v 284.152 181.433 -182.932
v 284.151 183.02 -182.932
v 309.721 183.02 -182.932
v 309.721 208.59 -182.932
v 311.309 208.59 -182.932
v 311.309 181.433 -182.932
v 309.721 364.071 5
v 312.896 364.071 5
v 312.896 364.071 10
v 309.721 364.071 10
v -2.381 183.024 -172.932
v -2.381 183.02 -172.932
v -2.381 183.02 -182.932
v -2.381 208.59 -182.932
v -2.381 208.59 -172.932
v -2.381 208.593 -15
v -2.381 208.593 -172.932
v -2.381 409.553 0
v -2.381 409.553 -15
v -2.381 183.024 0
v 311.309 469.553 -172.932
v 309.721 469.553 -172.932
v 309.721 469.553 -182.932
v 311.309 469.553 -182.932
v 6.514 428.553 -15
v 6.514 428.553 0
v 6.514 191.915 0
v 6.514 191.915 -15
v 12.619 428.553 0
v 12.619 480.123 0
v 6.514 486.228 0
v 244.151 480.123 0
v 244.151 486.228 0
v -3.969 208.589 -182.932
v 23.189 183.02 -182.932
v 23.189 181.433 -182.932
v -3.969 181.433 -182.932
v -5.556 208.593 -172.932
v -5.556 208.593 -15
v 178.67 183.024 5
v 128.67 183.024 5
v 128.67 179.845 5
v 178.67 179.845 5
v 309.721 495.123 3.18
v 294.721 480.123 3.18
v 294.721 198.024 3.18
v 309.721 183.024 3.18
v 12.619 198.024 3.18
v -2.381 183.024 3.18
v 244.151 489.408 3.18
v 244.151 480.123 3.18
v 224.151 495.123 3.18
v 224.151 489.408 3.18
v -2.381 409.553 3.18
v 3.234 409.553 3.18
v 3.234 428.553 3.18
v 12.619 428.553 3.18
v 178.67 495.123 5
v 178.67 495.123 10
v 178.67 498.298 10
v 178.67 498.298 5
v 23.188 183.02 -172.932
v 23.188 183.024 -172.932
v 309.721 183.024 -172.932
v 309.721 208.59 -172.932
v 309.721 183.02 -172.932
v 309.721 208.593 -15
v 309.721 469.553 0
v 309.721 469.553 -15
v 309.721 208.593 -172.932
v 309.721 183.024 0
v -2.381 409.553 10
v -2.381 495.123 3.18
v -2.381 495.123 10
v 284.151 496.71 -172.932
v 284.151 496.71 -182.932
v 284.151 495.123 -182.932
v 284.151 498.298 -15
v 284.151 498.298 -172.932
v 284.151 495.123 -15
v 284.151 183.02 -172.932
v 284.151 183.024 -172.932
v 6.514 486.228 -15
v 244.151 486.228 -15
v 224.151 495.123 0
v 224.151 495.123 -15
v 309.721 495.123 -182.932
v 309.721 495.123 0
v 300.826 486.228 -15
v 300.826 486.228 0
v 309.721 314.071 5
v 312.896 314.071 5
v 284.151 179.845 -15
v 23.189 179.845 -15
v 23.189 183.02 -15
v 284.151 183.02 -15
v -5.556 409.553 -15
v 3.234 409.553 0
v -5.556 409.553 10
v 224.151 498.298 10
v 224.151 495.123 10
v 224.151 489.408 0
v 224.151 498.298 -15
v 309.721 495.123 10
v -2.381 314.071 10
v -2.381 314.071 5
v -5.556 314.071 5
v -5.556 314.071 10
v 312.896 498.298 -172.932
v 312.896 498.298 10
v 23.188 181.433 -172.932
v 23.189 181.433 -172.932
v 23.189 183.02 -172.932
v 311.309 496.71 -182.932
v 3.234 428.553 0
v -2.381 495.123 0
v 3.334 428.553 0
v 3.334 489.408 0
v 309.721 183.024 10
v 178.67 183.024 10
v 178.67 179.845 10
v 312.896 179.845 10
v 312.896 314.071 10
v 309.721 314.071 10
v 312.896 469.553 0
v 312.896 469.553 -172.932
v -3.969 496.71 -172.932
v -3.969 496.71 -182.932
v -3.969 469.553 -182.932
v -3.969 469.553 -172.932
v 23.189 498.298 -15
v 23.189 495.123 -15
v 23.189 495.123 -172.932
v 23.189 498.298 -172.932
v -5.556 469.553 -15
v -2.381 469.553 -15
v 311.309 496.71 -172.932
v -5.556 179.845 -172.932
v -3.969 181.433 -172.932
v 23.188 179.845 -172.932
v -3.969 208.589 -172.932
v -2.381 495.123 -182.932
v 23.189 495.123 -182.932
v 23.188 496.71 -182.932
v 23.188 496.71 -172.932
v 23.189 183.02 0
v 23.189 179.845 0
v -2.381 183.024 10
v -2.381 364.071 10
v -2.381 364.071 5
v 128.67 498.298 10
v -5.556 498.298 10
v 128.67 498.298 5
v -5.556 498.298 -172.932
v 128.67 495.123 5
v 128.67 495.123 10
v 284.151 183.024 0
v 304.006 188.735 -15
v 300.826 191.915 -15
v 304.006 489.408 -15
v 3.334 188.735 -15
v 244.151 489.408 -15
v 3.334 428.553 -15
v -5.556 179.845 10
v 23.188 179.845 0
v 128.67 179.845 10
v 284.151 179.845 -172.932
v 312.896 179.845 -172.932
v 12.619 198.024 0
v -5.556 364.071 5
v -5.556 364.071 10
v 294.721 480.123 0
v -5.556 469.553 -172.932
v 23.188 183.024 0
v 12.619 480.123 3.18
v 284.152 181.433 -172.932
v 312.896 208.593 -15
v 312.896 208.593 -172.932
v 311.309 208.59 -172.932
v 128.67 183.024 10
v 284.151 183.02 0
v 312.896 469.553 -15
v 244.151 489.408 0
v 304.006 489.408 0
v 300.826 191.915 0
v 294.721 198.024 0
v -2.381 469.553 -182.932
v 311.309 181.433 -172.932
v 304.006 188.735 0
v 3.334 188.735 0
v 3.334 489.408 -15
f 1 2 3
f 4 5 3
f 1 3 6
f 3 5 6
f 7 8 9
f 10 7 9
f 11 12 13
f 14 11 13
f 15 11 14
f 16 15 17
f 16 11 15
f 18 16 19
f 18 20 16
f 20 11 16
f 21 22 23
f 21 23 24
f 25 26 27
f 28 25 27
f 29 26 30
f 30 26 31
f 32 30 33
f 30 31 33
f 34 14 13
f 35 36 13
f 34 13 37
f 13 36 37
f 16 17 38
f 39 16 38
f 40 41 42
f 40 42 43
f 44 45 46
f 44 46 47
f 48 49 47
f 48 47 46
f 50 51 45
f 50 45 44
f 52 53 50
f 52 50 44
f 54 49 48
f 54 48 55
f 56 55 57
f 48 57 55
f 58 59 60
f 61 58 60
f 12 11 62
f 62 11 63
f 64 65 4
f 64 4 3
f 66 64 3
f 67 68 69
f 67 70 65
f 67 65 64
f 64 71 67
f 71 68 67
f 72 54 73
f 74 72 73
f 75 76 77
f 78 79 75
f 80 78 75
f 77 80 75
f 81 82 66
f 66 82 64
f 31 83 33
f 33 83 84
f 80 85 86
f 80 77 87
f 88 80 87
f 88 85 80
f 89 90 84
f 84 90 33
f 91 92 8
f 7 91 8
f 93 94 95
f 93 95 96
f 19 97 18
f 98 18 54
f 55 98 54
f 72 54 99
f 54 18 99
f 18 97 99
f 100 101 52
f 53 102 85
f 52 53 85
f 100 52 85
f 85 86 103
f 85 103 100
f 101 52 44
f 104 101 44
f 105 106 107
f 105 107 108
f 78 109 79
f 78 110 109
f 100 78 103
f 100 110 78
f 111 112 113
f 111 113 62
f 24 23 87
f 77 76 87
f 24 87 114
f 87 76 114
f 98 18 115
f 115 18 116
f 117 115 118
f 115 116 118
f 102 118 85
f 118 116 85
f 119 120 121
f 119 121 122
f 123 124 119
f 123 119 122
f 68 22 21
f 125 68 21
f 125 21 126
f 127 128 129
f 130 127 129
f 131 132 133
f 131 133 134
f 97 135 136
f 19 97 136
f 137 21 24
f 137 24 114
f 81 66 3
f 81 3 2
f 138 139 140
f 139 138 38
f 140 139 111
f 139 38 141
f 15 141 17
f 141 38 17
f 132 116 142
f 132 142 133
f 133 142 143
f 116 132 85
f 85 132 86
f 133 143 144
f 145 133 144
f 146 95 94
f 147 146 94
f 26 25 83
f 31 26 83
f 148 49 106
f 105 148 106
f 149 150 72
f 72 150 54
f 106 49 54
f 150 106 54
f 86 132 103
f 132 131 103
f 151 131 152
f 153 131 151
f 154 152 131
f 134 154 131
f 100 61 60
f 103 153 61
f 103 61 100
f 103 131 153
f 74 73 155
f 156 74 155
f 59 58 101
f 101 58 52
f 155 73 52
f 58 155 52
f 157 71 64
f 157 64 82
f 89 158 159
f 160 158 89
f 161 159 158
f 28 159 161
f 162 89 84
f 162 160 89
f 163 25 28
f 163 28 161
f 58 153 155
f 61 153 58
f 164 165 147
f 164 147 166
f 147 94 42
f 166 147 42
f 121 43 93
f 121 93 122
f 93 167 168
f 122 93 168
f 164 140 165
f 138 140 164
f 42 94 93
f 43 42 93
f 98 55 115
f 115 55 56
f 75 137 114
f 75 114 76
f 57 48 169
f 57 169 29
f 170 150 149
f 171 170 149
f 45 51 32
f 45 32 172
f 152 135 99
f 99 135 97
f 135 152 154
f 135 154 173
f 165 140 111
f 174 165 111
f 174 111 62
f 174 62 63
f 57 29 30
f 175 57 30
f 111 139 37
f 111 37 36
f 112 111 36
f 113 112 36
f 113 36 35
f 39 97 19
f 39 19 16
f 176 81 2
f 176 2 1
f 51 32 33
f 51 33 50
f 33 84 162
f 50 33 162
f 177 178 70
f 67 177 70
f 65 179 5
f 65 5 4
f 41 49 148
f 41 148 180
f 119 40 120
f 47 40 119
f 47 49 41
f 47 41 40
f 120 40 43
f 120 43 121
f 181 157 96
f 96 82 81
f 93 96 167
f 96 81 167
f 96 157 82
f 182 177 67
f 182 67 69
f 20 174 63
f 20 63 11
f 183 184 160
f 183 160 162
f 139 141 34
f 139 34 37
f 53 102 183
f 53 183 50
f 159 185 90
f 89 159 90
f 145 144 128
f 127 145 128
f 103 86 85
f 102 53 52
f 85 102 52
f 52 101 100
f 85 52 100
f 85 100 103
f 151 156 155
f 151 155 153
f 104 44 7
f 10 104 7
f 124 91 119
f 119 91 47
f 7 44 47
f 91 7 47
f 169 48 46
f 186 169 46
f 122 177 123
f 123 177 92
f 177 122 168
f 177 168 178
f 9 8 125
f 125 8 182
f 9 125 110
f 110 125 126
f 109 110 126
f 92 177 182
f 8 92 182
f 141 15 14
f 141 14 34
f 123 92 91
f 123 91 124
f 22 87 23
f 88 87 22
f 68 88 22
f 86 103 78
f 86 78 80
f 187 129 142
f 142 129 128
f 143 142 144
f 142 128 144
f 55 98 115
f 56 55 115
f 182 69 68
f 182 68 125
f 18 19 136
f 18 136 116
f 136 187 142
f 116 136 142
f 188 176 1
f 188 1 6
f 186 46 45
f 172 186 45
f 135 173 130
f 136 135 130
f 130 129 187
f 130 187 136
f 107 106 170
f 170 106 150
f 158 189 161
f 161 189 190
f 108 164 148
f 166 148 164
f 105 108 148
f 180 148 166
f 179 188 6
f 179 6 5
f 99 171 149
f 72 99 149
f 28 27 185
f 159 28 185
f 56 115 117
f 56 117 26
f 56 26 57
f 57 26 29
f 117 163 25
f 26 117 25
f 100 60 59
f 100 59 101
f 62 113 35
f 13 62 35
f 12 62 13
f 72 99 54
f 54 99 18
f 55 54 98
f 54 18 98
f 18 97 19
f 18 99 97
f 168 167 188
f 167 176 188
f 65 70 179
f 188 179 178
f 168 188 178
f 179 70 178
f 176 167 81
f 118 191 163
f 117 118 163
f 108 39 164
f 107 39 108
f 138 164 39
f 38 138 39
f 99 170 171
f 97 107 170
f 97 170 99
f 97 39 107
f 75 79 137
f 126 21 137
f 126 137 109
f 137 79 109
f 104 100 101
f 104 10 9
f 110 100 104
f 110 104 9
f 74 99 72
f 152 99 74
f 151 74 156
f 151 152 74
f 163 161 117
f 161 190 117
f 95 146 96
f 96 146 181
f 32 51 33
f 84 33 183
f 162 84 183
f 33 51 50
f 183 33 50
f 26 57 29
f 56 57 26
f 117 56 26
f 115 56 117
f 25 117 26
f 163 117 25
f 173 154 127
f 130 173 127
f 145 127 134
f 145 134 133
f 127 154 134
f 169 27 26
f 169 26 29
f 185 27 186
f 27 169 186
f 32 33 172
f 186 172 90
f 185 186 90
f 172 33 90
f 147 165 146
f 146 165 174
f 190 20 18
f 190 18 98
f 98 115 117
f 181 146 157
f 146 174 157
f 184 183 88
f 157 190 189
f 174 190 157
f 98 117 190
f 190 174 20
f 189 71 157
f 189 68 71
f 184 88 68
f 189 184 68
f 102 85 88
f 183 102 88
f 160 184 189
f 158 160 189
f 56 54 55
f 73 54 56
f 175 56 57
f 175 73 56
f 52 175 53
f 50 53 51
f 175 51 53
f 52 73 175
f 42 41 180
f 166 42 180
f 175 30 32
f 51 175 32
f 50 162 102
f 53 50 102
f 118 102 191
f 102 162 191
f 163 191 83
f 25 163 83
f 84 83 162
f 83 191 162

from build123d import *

# Parameters (mm, degrees)
SKETCH1_W                = 260.9625
SKETCH1_H                = 3.175
BOSS_EXTRUDE1_DEPTH      = 10
SKETCH1_W_2              = 3.175
SKETCH1_H_2              = 260.959519773
BOSS_EXTRUDE1_2_DEPTH    = 10
SKETCH1_H_3              = 260.960289546
BOSS_EXTRUDE1_3_DEPTH    = 10
SKETCH1_W_3              = 260.963269773
SKETCH1_H_4              = 3.17875
BOSS_EXTRUDE1_4_DEPTH    = 10
SKETCH1_2_W              = 312.1025
SKETCH1_2_H              = 312.09875
BOSS_EXTRUDE2_DEPTH      = 3.18
BOSS_EXTRUDE4_DEPTH      = 10
BOSS_EXTRUDE4_DEPTH_BACK = 172.932
SKETCH2_W                = 282.1025
SKETCH2_H                = 282.09875
CUT_EXTRUDE1_DEPTH       = 3.18
CUT_EXTRUDE2_START       = -318.4525
SKETCH4_W                = 5
SKETCH4_H                = 50
CUT_EXTRUDE2_DEPTH       = 318.4525
CUT_EXTRUDE3_START       = -318.4525
SKETCH5_W                = 50
SKETCH5_H                = 5
CUT_EXTRUDE3_DEPTH       = 318.4525
SKETCH6_W                = 300.6725
SKETCH6_H                = 3.18
SKETCH6_W_2              = 260.9625
SKETCH6_H_2              = 3.175
BOSS_EXTRUDE5_DEPTH      = 15
CIRPATTERN11_COUNT       = 4
BOSS_EXTRUDE9_DEPTH      = 10
CIRPATTERN16_COUNT       = 4
SPLIT1_START             = -15
SPLIT1_DEPTH             = 18.18
SPLIT1_START_2           = -172.932
SPLIT1_2_DEPTH           = 182.932
SPLIT1_3_DEPTH           = 3.18
SPLIT1_START_3           = 3.18
SPLIT1_4_OUTLINE_W       = 45.48125
SPLIT1_4_OUTLINE_H       = 3.175
SPLIT1_4_OUTLINE_W_2     = 105.48125
SPLIT1_4_OUTLINE_W_3     = 3.175
SPLIT1_4_OUTLINE_H_2     = 60
SPLIT1_4_DEPTH           = 6.82
SPLIT1_START_4           = -182.932
SPLIT1_5_DEPTH           = 10
SPLIT1_6_OUTLINE_W       = 50
SPLIT1_6_OUTLINE_H       = 3.175
SPLIT1_6_DEPTH           = 1.82
SPLIT1_START_5           = -5.55625
SPLIT1_7_DEPTH           = 249.7075
SPLIT1_8_DEPTH           = 229.7075
SPLIT1_9_OUTLINE_W       = 19
SPLIT1_9_OUTLINE_H       = 18.18
SPLIT1_9_DEPTH           = 8.79


# Read off the part's stored shape, not the designer's step: Split1
with BuildPart() as part:
    # Sketch1 → Boss-Extrude1 (new body)
    with BuildSketch(Plane.XY):
        with Locations((153.67, 496.71005)):
            Rectangle(SKETCH1_W, SKETCH1_H)
    extrude(amount=BOSS_EXTRUDE1_DEPTH)



with BuildPart() as body_2:
    # Sketch1 → Boss-Extrude1 2 (new body)
    with BuildSketch(Plane.XY):
        with Locations((-3.96875, 339.072790114)):
            Rectangle(SKETCH1_W_2, SKETCH1_H_2)
    extrude(amount=BOSS_EXTRUDE1_2_DEPTH)


with BuildPart() as body_3:
    # Sketch1 → Boss-Extrude1 3 (new body)
    with BuildSketch(Plane.XY):
        with Locations((311.30875, 339.073175)):
            Rectangle(SKETCH1_W_2, SKETCH1_H_3)
    extrude(amount=BOSS_EXTRUDE1_3_DEPTH)


with BuildPart() as body_4:
    # Sketch1 → Boss-Extrude1 4 (new body)
    with BuildSketch(Plane.XY):
        with Locations((153.669615114, 181.434425)):
            Rectangle(SKETCH1_W_3, SKETCH1_H_4)
    extrude(amount=BOSS_EXTRUDE1_4_DEPTH)


with BuildPart() as part_1:
    add(part.part)

    add(body_2.part)  # Boss-Extrude2 merges body 2

    add(body_3.part)  # Boss-Extrude2 merges body 3

    add(body_4.part)  # Boss-Extrude2 merges body 4
    # Sketch1<2> → Boss-Extrude2 (add)
    with BuildSketch(Plane.XY):
        with Locations((153.67, 339.073175)):
            Rectangle(SKETCH1_2_W, SKETCH1_2_H)
    extrude(amount=BOSS_EXTRUDE2_DEPTH)

    # Sketch1<5> → Boss-Extrude4 (add, two sides: drawn at the far end of the back side and taken through both)
    with BuildSketch(Plane.XY.offset(-BOSS_EXTRUDE4_DEPTH_BACK)):
        Polygon((284.15125, 495.12255), (309.72125, 495.12255), (309.72125, 469.553319773), (312.89625, 469.553319773), (312.89625, 498.29755), (284.15125, 498.29755), align=None)
        Polygon((-2.38125, 495.12255), (23.18875, 495.12255), (23.18875, 498.29755), (-5.55625, 498.29755), (-5.55625, 469.55255), (-2.38125, 469.55255), align=None)
        Polygon((-2.38125, 183.0238), (-2.38125, 208.593030227), (-5.55625, 208.593030227), (-5.55625, 179.84505), (23.187980227, 179.84505), (23.187980227, 183.0238), align=None)
        Polygon((312.89625, 208.593030227), (309.72125, 208.593030227), (309.72125, 183.0238), (284.15125, 183.0238), (284.15125, 179.84505), (312.89625, 179.84505), align=None)
    extrude(amount=BOSS_EXTRUDE4_DEPTH + BOSS_EXTRUDE4_DEPTH_BACK)

    # Sketch2 → Cut-Extrude1 (cut)
    with BuildSketch(Plane.XY.offset(3.18)):
        with Locations((153.67, 339.073175)):
            Rectangle(SKETCH2_W, SKETCH2_H)
    extrude(amount=-CUT_EXTRUDE1_DEPTH, mode=Mode.SUBTRACT)

    # Sketch4 → Cut-Extrude2 (cut)
    with BuildSketch(Plane.ZY.offset(5.55625).offset(CUT_EXTRUDE2_START)):
        with Locations((7.5, 339.0713)):
            Rectangle(SKETCH4_W, SKETCH4_H)
    extrude(amount=CUT_EXTRUDE2_DEPTH, mode=Mode.SUBTRACT)

    # Sketch5 → Cut-Extrude3 (cut)
    with BuildSketch(Plane.XZ.offset(-179.84505).offset(CUT_EXTRUDE3_START)):
        with Locations((153.67, 7.5)):
            Rectangle(SKETCH5_W, SKETCH5_H)
    extrude(amount=CUT_EXTRUDE3_DEPTH, mode=Mode.SUBTRACT)

    # Sketch6 → Boss-Extrude5 (add)
    with BuildSketch(Plane(origin=(0, 0, 0), x_dir=(-1, 0, 0), z_dir=(0, 0, -1))):
        with Locations((-153.67, 487.81755)):
            Rectangle(SKETCH6_W, SKETCH6_H)
        with Locations((-153.67, 496.71005)):
            Rectangle(SKETCH6_W_2, SKETCH6_H_2)
    boss_extrude5 = extrude(amount=BOSS_EXTRUDE5_DEPTH)

    # CirPattern11: Boss-Extrude5 ×4 about axis
    cirpattern11_axis = Axis((153.67, 339.0713, 0), (0, 0, 1))
    for i in range(1, CIRPATTERN11_COUNT):
        add(boss_extrude5.rotate(cirpattern11_axis, i * 360 / CIRPATTERN11_COUNT))

    # Sketch12 → Boss-Extrude9 (add)
    with BuildSketch(Plane(origin=(0, 0, -172.932), x_dir=(-1, 0, 0), z_dir=(0, 0, -1))):
        Polygon((-309.72125, 469.55255), (-311.30875, 469.553319773), (-311.30875, 496.71005), (-284.15125, 496.71005), (-284.15125, 495.12255), (-309.72125, 495.12255), align=None)
    boss_extrude9 = extrude(amount=BOSS_EXTRUDE9_DEPTH)

    # CirPattern16: Boss-Extrude9 ×4 about axis
    cirpattern16_axis = Axis((153.67, 339.0713, 0), (0, 0, 1))
    for i in range(1, CIRPATTERN16_COUNT):
        add(boss_extrude9.rotate(cirpattern16_axis, i * 360 / CIRPATTERN16_COUNT))

    # Split1 7 outline → Split1 7 (cut)
    with BuildSketch(Plane.YZ.offset(SPLIT1_START_5)):
        Polygon((489.40755, 0), (489.40755, 3.18), (495.12255, 3.18), (495.12255, 10), (409.55255, 10), (409.55255, 3.18), (428.55255, 3.18), (428.55255, -15), (469.55255, -15), (469.55255, -182.932), (496.71005, -182.932), (496.71005, -172.932), (498.29755, -172.932), (498.29755, -15), (495.12255, -15), (495.12255, 0), align=None)
    extrude(amount=SPLIT1_7_DEPTH, mode=Mode.SUBTRACT)

    # Split1 8 outline → Split1 8 (cut)
    with BuildSketch(Plane.YZ.offset(SPLIT1_START_5)):
        Polygon((489.40755, 3.18), (489.40755, 0), (495.12255, 0), (495.12255, -15), (498.29755, -15), (498.29755, 10), (495.12255, 10), (495.12255, 3.18), align=None)
    extrude(amount=SPLIT1_8_DEPTH, mode=Mode.SUBTRACT)

    # Split1 9 outline → Split1 9 (cut)
    with BuildSketch(Plane.YZ.offset(SPLIT1_START_5)):
        with Locations((419.05255, -5.91)):
            Rectangle(SPLIT1_9_OUTLINE_W, SPLIT1_9_OUTLINE_H)
    extrude(amount=SPLIT1_9_DEPTH, mode=Mode.SUBTRACT)


with BuildPart() as body_2_2:
    # Split1 outline → Split1 (new body)
    with BuildSketch(Plane.XY.offset(SPLIT1_START)):
        Polygon((6.51375, 486.22755), (244.15125, 486.22755), (244.15125, 489.40755), (3.33375, 489.40755), (3.33375, 428.55255), (6.51375, 428.55255), align=None)
        Polygon((224.15125, 495.12255), (224.15125, 498.29755), (-5.55625, 498.29755), (-5.55625, 409.55255), (-2.38125, 409.55255), (-2.38125, 495.12255), align=None)
    extrude(amount=SPLIT1_DEPTH)

    # Split1 2 outline → Split1 2 (add)
    with BuildSketch(Plane.XY.offset(SPLIT1_START_2)):
        Polygon((-2.38125, 495.12255), (23.18875, 495.12255), (23.18875, 498.29755), (-5.55625, 498.29755), (-5.55625, 469.55255), (-2.38125, 469.55255), align=None)
    extrude(amount=SPLIT1_2_DEPTH)

    # Split1 3 outline → Split1 3 (add)
    with BuildSketch(Plane.XY):
        Polygon((12.61875, 480.12255), (244.15125, 480.12255), (244.15125, 486.22755), (6.51375, 486.22755), (6.51375, 428.55255), (12.61875, 428.55255), align=None)
        Polygon((3.33375, 489.40755), (224.15125, 489.40755), (224.15125, 495.12255), (-2.38125, 495.12255), (-2.38125, 409.55255), (3.23375, 409.55255), (3.23375, 428.55255), (3.33375, 428.55255), align=None)
    extrude(amount=SPLIT1_3_DEPTH)

    # Split1 4 outline → Split1 4 (add)
    with BuildSketch(Plane.XY.offset(SPLIT1_START_3)):
        with Locations((201.410625, 496.71005)):
            Rectangle(SPLIT1_4_OUTLINE_W, SPLIT1_4_OUTLINE_H)
        with Locations((75.929375, 496.71005)):
            Rectangle(SPLIT1_4_OUTLINE_W_2, SPLIT1_4_OUTLINE_H)
        with Locations((-3.96875, 439.55255)):
            Rectangle(SPLIT1_4_OUTLINE_W_3, SPLIT1_4_OUTLINE_H_2)
    extrude(amount=SPLIT1_4_DEPTH)

    # Split1 5 outline → Split1 5 (add)
    with BuildSketch(Plane.XY.offset(SPLIT1_START_4)):
        Polygon((-2.38125, 495.12255), (23.18875, 495.12255), (23.187980227, 496.71005), (-3.96875, 496.71005), (-3.96875, 469.55255), (-2.38125, 469.55255), align=None)
    extrude(amount=SPLIT1_5_DEPTH)

    # Split1 6 outline → Split1 6 (add)
    with BuildSketch(Plane.XY.offset(SPLIT1_START_3)):
        with Locations((153.67, 496.71005)):
            Rectangle(SPLIT1_6_OUTLINE_W, SPLIT1_6_OUTLINE_H)
    extrude(amount=SPLIT1_6_DEPTH)


solid = Compound([part_1.part, body_2_2.part])
